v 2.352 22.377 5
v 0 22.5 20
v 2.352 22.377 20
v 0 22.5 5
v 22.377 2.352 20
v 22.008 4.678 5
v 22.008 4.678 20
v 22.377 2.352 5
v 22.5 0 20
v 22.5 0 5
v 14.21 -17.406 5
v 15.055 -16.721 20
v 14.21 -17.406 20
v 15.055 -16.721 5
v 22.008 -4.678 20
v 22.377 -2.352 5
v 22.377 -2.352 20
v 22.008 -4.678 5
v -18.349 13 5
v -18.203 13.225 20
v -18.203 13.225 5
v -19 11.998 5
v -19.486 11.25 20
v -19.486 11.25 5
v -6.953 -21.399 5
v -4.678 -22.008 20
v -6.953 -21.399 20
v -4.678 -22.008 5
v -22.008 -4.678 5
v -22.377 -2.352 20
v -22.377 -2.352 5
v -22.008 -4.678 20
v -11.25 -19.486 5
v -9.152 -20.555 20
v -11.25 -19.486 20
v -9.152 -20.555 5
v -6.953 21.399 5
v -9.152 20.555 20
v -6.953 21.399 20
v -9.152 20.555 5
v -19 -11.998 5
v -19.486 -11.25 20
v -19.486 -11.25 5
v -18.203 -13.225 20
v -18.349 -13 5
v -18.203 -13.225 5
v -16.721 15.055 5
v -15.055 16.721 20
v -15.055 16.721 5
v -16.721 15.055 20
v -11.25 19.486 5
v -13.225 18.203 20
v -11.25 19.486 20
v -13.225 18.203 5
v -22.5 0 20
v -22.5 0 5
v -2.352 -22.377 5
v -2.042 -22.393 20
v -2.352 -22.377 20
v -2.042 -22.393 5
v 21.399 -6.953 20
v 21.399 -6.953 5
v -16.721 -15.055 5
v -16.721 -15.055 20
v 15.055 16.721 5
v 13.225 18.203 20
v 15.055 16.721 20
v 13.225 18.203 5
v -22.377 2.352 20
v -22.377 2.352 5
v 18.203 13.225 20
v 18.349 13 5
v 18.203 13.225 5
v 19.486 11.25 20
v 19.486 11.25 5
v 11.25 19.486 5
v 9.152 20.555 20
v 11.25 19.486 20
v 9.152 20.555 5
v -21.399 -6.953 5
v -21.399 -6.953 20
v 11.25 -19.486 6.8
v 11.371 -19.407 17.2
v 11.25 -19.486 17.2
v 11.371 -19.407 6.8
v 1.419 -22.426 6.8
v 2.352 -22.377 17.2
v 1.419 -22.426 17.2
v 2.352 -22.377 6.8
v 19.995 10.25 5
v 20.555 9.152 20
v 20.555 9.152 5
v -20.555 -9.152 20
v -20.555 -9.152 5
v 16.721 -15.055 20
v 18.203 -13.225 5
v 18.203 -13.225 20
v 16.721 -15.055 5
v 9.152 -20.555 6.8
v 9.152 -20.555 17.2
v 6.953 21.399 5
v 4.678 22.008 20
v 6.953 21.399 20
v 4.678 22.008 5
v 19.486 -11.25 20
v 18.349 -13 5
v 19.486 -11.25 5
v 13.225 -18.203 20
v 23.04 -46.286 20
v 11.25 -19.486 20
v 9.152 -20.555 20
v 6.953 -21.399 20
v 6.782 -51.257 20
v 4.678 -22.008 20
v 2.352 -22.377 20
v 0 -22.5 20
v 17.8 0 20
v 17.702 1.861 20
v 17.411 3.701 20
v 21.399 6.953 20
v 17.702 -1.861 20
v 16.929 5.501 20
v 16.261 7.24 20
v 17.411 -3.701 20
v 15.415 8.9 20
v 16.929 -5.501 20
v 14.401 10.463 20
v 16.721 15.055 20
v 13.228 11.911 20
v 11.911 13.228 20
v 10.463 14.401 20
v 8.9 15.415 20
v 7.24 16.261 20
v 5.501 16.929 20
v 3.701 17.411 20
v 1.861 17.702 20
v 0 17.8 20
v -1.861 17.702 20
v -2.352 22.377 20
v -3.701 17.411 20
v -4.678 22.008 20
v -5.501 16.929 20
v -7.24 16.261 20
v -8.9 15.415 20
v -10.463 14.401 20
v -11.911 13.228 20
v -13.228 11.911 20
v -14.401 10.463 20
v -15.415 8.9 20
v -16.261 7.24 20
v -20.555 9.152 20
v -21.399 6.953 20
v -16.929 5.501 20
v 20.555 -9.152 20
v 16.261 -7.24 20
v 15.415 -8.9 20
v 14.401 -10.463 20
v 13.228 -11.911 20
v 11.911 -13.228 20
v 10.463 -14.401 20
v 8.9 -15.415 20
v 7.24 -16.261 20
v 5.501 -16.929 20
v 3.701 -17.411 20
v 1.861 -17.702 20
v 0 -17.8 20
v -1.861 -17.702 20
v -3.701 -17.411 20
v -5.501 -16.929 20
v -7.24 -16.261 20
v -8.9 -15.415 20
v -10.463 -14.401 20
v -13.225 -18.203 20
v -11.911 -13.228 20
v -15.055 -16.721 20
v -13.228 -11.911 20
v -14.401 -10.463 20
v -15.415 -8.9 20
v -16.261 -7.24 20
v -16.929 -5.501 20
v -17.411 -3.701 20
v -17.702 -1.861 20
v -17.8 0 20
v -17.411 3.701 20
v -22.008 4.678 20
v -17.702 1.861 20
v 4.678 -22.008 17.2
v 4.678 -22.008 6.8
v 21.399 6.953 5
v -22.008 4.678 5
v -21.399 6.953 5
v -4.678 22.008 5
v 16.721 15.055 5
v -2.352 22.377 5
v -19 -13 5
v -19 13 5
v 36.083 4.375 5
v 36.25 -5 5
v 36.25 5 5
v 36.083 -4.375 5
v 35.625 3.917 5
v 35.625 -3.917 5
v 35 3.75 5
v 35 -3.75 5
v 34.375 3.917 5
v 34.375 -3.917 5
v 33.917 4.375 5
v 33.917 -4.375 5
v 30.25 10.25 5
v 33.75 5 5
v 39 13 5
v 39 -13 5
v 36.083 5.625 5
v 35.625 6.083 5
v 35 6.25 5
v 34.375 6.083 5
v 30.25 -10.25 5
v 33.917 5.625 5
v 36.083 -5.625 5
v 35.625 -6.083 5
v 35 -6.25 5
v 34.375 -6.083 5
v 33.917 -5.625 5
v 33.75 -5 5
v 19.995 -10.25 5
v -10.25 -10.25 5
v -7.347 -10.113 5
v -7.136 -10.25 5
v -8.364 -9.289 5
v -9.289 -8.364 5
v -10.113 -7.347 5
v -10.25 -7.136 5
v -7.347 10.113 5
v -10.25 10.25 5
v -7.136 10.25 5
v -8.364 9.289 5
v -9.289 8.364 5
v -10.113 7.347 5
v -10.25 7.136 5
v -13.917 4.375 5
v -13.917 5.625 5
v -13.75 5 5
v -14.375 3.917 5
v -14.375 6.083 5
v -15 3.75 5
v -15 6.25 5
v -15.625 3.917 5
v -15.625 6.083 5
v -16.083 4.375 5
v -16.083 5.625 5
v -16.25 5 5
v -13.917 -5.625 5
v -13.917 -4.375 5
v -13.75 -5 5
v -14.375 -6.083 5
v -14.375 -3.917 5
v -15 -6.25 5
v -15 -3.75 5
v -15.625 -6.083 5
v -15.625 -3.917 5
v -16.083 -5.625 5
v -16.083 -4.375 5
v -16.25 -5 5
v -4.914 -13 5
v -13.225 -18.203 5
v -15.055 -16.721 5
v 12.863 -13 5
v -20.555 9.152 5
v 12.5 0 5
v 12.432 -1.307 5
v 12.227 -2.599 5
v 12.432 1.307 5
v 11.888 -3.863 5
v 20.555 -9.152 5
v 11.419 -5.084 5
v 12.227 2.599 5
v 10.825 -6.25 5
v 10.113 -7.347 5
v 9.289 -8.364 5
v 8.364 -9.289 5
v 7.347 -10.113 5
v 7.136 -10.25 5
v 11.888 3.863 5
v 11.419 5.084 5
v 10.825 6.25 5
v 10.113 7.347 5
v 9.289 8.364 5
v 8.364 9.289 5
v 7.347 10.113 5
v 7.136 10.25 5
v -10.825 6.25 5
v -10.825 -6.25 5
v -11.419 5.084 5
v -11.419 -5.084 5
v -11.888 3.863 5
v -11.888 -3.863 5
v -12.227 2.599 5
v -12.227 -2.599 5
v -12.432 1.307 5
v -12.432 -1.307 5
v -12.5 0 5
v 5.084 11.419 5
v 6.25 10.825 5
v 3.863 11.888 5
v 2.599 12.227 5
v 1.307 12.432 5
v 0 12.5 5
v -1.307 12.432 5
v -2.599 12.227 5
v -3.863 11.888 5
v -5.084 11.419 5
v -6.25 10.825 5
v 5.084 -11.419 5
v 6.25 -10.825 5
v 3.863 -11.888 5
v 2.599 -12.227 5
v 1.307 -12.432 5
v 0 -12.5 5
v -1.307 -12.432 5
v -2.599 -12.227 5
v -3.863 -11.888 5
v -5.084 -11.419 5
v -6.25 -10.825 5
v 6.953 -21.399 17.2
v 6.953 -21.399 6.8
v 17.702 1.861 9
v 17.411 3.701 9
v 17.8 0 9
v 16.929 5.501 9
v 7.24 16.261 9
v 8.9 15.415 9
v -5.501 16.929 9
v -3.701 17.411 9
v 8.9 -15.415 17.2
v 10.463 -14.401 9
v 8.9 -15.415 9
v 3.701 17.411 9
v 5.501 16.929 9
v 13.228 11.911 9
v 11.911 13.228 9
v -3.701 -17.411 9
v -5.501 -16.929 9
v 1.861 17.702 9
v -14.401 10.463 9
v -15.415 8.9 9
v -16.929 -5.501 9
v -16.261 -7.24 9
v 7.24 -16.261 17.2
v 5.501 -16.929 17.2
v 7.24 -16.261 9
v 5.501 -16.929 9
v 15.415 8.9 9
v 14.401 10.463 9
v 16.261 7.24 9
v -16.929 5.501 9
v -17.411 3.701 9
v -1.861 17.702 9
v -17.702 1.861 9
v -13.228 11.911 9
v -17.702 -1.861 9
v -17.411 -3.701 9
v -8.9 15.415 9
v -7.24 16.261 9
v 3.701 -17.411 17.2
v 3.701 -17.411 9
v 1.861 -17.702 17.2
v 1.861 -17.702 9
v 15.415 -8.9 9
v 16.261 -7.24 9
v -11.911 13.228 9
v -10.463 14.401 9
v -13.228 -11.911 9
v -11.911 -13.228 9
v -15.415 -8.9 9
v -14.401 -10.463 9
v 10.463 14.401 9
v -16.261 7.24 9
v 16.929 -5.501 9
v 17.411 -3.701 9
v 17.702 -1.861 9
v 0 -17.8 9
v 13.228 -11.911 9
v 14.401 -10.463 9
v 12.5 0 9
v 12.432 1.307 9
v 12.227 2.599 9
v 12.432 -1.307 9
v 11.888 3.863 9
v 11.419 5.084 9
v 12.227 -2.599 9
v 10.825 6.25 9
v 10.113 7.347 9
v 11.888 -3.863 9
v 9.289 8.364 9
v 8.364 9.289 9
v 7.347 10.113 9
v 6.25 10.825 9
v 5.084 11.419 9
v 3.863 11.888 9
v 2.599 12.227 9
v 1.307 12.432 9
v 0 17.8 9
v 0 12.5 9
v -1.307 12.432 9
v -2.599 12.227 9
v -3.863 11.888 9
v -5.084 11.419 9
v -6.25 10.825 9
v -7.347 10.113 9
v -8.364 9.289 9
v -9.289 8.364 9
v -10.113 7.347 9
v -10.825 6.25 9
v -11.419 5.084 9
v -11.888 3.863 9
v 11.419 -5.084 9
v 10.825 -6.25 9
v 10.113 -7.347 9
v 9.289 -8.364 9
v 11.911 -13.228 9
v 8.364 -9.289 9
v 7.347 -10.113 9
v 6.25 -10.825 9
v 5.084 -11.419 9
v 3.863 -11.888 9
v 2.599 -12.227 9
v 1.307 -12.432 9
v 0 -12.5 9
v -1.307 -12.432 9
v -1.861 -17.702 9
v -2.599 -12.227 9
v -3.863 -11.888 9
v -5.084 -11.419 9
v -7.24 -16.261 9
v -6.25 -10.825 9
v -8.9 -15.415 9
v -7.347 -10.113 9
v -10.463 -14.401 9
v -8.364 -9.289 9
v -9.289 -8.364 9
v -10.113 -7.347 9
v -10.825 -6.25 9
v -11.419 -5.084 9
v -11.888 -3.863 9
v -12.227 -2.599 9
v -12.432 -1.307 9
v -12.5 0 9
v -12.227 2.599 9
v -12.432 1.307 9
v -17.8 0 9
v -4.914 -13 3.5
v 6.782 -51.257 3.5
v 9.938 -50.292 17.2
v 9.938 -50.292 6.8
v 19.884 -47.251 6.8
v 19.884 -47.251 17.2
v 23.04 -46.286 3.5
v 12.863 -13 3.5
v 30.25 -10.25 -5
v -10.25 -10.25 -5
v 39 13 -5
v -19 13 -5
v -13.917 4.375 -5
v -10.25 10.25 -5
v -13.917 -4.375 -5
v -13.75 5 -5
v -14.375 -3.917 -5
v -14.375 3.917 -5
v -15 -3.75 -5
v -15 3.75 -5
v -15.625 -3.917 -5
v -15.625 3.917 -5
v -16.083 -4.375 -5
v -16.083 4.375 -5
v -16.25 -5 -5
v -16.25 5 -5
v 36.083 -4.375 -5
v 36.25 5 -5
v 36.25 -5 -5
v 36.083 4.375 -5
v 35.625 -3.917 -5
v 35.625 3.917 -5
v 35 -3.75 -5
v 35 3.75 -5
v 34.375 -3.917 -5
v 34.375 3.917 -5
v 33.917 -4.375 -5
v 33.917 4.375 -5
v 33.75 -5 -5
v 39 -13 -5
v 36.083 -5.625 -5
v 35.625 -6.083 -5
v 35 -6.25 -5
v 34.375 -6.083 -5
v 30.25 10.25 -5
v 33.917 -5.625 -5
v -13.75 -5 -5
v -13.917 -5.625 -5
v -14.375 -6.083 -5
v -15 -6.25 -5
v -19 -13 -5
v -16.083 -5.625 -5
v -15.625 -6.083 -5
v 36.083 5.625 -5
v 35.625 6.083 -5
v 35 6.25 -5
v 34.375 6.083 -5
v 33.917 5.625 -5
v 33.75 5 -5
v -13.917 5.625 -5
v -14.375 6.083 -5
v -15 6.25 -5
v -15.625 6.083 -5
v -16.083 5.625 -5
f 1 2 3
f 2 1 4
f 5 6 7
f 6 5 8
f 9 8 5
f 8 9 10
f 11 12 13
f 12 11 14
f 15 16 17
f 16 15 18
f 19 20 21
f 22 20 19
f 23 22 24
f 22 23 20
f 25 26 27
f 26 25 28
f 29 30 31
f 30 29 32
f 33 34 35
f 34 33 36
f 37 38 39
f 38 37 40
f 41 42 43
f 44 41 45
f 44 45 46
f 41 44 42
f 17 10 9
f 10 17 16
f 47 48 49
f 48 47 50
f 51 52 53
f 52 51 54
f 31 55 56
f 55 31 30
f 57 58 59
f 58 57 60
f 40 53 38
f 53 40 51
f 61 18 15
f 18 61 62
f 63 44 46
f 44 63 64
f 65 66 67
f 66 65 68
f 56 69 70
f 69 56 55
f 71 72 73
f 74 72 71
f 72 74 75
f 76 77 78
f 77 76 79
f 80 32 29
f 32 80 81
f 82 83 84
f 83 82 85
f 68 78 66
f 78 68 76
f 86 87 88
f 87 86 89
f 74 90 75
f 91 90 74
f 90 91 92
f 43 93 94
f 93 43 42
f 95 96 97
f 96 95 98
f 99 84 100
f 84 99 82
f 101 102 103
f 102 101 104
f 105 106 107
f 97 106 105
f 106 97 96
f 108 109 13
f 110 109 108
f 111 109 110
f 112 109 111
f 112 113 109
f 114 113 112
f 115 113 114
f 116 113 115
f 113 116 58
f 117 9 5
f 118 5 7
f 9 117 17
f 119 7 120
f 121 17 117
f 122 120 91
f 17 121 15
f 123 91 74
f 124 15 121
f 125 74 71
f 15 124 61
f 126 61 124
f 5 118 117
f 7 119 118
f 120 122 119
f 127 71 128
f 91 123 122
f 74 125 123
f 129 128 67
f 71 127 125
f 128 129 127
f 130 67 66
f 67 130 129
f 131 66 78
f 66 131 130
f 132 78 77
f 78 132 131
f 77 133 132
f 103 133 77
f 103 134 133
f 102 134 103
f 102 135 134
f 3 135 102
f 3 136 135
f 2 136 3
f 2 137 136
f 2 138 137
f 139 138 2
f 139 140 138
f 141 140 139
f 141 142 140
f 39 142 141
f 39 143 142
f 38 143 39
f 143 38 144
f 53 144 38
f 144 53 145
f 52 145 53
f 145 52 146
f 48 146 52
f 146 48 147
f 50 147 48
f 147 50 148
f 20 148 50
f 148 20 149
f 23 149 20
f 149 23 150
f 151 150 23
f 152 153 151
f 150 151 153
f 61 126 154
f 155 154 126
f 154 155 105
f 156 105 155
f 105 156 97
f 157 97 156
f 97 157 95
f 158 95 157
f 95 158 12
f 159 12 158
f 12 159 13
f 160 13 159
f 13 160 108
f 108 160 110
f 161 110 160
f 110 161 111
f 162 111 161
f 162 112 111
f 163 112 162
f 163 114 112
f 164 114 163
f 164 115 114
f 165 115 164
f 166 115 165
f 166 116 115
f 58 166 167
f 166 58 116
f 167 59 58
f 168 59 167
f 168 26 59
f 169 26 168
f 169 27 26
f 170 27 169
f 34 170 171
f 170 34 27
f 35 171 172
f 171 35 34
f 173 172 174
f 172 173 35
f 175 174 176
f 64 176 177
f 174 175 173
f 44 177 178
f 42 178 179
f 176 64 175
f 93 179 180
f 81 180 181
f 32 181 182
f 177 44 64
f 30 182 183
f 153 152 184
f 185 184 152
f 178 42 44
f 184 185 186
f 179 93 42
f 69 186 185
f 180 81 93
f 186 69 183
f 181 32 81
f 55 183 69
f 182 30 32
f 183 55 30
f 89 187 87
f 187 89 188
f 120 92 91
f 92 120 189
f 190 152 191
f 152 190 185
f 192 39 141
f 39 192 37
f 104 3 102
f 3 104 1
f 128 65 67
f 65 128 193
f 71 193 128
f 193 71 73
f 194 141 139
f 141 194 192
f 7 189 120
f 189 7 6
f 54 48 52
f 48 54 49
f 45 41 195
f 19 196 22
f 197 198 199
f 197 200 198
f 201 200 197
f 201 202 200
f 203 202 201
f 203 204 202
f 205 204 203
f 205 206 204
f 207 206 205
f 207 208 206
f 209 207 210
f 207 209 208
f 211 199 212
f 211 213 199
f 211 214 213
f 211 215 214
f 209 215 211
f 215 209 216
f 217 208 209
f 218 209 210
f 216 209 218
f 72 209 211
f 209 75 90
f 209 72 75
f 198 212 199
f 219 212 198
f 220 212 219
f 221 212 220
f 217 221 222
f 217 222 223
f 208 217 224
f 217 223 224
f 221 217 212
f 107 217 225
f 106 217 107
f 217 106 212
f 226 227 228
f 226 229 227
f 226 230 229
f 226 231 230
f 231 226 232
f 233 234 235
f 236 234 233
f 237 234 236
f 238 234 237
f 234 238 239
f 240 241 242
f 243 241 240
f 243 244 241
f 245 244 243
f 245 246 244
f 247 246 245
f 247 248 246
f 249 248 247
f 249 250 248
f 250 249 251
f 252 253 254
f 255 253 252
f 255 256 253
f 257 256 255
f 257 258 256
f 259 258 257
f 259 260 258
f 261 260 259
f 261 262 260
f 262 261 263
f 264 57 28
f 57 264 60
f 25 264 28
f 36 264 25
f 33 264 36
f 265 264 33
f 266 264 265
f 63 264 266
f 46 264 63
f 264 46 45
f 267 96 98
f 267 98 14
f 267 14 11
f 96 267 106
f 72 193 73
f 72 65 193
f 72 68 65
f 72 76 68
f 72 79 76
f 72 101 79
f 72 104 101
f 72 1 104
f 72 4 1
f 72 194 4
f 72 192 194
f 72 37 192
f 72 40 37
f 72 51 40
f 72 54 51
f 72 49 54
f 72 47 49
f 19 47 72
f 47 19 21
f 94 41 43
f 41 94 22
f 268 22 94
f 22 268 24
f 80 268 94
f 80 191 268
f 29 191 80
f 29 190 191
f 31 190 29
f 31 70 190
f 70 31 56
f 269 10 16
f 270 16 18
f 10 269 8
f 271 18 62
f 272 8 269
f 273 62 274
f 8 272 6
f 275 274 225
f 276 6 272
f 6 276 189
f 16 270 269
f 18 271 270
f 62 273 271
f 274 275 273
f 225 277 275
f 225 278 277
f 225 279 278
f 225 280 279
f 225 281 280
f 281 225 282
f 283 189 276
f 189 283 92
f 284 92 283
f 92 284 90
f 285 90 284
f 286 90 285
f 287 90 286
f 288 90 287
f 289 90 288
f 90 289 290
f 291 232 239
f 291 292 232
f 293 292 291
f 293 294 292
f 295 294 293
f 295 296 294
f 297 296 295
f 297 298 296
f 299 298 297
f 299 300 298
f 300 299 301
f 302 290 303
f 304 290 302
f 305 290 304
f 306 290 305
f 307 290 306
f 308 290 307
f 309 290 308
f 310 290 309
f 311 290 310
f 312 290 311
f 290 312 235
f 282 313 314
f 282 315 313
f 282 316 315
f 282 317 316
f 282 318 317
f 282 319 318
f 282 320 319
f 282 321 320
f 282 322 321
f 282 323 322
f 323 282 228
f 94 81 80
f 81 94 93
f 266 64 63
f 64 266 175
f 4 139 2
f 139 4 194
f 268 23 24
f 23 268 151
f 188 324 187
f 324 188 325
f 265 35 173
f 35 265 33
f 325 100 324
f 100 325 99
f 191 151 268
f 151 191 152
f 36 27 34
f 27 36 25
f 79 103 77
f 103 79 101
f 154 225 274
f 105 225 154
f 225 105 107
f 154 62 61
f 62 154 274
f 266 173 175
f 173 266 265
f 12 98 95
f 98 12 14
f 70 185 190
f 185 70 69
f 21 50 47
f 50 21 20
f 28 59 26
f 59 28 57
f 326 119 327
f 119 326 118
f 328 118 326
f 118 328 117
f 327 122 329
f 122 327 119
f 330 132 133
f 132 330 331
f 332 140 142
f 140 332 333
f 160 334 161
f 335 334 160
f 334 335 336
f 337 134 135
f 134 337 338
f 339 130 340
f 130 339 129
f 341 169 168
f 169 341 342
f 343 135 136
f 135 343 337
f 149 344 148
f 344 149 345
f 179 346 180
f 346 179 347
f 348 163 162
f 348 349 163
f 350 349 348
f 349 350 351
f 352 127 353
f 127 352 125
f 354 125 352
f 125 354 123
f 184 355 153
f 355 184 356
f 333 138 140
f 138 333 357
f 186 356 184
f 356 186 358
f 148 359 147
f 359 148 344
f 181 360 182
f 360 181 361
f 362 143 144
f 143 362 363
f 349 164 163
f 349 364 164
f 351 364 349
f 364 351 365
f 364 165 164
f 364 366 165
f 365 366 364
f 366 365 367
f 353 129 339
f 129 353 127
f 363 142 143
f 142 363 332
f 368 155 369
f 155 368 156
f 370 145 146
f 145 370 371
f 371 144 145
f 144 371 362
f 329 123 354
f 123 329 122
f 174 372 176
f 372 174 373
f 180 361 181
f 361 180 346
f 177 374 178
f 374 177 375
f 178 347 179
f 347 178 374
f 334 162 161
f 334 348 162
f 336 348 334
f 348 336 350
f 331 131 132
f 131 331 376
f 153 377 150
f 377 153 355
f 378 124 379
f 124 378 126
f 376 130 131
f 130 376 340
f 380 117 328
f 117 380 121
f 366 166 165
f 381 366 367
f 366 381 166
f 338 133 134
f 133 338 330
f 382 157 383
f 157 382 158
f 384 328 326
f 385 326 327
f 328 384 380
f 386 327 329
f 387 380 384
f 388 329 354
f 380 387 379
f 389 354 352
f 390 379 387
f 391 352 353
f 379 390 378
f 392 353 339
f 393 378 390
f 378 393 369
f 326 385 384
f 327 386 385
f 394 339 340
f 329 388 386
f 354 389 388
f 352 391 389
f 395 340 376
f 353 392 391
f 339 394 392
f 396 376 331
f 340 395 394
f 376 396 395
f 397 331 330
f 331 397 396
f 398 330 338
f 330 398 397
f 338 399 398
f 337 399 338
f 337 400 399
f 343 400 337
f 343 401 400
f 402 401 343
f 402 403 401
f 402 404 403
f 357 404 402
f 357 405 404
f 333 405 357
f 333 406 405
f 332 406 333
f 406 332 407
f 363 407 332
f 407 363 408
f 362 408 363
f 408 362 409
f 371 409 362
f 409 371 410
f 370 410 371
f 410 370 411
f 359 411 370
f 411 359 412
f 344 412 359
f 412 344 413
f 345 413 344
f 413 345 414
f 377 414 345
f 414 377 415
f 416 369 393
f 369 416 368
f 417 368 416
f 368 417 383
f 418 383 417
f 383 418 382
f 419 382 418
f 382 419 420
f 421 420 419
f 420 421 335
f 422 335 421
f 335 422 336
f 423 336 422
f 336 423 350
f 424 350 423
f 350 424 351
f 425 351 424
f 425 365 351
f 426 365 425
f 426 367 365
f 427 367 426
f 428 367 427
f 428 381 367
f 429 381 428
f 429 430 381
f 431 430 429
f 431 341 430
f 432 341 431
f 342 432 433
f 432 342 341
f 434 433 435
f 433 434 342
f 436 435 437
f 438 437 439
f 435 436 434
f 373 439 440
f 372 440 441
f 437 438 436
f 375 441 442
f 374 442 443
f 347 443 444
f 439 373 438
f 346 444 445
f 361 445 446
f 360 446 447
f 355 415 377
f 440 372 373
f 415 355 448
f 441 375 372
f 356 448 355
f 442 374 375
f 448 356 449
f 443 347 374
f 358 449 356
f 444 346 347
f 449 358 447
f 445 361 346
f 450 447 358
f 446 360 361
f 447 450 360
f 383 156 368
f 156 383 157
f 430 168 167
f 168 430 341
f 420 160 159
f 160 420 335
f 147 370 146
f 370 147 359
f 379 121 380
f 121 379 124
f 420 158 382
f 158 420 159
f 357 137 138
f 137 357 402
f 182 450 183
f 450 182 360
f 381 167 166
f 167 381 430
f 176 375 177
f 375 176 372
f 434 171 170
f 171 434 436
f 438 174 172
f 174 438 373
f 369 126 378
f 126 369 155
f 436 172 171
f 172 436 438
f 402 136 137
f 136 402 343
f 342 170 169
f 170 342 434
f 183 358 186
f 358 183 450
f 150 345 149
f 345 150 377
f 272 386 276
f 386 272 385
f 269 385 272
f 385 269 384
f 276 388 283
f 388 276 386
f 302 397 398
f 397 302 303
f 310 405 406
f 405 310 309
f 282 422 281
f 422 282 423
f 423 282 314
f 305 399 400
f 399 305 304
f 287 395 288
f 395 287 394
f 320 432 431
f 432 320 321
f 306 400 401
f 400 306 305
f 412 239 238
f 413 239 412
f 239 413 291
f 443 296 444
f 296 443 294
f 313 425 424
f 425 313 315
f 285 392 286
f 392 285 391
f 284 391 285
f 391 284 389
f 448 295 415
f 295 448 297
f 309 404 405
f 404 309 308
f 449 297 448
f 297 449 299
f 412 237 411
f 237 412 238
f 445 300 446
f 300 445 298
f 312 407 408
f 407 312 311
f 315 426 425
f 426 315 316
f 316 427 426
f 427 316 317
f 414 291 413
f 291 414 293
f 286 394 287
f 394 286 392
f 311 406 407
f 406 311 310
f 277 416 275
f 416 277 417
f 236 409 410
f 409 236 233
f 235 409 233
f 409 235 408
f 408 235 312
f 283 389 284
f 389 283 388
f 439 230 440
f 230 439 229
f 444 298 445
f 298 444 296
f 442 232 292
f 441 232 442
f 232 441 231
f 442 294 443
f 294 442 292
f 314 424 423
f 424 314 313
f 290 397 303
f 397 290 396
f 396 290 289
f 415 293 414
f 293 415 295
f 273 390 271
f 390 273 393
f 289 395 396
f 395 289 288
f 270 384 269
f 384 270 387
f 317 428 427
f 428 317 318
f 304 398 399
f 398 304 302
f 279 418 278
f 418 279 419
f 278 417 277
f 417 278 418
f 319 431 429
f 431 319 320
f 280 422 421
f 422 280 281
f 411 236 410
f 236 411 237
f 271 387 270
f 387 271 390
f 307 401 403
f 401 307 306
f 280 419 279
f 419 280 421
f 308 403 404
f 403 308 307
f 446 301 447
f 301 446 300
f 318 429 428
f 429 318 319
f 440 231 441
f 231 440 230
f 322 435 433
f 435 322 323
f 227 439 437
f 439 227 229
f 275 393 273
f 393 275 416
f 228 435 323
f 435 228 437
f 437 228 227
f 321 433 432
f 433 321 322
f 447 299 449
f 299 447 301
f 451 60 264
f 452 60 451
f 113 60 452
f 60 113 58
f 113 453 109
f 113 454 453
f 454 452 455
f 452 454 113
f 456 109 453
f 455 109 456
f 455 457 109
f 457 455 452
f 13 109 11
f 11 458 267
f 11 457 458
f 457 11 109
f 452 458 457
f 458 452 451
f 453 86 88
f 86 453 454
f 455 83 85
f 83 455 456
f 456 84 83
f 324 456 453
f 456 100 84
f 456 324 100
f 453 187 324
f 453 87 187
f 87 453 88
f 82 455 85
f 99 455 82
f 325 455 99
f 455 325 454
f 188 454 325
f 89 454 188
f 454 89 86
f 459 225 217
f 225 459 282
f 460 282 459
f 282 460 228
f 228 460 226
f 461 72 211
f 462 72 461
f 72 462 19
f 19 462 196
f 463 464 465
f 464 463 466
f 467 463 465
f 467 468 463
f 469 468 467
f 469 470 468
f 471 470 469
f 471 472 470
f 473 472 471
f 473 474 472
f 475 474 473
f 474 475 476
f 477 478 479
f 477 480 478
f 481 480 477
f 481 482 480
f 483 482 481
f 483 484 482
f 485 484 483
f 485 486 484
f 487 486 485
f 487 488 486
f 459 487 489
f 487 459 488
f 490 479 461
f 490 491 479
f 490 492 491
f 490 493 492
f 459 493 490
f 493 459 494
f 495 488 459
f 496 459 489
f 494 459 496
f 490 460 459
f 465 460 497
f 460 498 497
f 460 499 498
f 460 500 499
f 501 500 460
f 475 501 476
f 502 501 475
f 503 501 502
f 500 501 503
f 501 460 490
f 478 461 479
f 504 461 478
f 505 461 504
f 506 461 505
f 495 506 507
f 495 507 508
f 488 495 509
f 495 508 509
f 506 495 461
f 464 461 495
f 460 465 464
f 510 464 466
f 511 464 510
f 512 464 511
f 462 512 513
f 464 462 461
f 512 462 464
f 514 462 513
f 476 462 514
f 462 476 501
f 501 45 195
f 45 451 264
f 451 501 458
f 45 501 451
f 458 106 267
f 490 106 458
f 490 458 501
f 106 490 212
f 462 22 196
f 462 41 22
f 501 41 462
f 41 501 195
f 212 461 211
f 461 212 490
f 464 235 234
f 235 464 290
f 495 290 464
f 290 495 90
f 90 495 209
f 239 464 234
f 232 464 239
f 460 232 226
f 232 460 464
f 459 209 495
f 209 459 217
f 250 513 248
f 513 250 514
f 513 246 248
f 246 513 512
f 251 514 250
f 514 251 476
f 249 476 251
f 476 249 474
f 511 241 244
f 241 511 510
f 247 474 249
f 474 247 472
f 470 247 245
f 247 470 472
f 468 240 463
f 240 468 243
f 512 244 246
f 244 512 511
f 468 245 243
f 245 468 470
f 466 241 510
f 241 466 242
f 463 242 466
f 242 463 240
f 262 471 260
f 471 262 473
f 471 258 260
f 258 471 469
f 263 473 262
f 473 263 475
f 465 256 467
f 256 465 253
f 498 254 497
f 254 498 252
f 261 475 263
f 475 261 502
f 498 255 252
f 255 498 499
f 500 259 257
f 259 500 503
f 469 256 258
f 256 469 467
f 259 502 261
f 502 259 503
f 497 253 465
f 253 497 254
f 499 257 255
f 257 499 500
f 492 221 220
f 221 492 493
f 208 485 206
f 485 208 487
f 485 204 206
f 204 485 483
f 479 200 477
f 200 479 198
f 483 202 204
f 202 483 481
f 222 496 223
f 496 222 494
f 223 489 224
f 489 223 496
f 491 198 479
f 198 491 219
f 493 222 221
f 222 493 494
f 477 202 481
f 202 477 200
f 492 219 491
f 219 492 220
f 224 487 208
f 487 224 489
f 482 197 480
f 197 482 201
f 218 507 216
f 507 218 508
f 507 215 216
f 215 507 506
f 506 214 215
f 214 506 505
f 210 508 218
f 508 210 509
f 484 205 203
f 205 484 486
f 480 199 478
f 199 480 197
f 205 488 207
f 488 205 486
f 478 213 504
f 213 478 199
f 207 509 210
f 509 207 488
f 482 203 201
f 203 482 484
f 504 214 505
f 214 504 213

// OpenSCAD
$fn=20;

translate([0,0,5])
difference(){
    cylinder(d=45,h=15,$fn=60);
    translate([0,0,4])cylinder(d=35.6,h=12,$fn=60);
    translate([0,0,-1])cylinder(d=25,h=12,$fn=60);
}

difference(){
rotate([0,0,-163])
translate([0,30,12])
rotate([90,0,0])
difference(){
cube([17,17,42],center=true);
cube([10.4,10.4,42],center=true);
}
translate([0,0,5])cylinder(d=35.6,h=16,$fn=60);
translate([0,0,25])cube([120,120,10],center=true);
translate([10,0,0])rotate([0,0,90])
cube([20.5,40.5,12],center=true);
}


$fn=12;
translate([10,0,0])rotate([0,0,90])
difference(){
cube([26,58,10],center=true);
cube([20.5,40.5,12],center=true);
translate([5,25,-6])cylinder(d=2.5,h=12);
translate([-5,25,-6])cylinder(d=2.5,h=12);
translate([-5,-25,-6])cylinder(d=2.5,h=12);
translate([5,-25,-6])cylinder(d=2.5,h=12);
}
